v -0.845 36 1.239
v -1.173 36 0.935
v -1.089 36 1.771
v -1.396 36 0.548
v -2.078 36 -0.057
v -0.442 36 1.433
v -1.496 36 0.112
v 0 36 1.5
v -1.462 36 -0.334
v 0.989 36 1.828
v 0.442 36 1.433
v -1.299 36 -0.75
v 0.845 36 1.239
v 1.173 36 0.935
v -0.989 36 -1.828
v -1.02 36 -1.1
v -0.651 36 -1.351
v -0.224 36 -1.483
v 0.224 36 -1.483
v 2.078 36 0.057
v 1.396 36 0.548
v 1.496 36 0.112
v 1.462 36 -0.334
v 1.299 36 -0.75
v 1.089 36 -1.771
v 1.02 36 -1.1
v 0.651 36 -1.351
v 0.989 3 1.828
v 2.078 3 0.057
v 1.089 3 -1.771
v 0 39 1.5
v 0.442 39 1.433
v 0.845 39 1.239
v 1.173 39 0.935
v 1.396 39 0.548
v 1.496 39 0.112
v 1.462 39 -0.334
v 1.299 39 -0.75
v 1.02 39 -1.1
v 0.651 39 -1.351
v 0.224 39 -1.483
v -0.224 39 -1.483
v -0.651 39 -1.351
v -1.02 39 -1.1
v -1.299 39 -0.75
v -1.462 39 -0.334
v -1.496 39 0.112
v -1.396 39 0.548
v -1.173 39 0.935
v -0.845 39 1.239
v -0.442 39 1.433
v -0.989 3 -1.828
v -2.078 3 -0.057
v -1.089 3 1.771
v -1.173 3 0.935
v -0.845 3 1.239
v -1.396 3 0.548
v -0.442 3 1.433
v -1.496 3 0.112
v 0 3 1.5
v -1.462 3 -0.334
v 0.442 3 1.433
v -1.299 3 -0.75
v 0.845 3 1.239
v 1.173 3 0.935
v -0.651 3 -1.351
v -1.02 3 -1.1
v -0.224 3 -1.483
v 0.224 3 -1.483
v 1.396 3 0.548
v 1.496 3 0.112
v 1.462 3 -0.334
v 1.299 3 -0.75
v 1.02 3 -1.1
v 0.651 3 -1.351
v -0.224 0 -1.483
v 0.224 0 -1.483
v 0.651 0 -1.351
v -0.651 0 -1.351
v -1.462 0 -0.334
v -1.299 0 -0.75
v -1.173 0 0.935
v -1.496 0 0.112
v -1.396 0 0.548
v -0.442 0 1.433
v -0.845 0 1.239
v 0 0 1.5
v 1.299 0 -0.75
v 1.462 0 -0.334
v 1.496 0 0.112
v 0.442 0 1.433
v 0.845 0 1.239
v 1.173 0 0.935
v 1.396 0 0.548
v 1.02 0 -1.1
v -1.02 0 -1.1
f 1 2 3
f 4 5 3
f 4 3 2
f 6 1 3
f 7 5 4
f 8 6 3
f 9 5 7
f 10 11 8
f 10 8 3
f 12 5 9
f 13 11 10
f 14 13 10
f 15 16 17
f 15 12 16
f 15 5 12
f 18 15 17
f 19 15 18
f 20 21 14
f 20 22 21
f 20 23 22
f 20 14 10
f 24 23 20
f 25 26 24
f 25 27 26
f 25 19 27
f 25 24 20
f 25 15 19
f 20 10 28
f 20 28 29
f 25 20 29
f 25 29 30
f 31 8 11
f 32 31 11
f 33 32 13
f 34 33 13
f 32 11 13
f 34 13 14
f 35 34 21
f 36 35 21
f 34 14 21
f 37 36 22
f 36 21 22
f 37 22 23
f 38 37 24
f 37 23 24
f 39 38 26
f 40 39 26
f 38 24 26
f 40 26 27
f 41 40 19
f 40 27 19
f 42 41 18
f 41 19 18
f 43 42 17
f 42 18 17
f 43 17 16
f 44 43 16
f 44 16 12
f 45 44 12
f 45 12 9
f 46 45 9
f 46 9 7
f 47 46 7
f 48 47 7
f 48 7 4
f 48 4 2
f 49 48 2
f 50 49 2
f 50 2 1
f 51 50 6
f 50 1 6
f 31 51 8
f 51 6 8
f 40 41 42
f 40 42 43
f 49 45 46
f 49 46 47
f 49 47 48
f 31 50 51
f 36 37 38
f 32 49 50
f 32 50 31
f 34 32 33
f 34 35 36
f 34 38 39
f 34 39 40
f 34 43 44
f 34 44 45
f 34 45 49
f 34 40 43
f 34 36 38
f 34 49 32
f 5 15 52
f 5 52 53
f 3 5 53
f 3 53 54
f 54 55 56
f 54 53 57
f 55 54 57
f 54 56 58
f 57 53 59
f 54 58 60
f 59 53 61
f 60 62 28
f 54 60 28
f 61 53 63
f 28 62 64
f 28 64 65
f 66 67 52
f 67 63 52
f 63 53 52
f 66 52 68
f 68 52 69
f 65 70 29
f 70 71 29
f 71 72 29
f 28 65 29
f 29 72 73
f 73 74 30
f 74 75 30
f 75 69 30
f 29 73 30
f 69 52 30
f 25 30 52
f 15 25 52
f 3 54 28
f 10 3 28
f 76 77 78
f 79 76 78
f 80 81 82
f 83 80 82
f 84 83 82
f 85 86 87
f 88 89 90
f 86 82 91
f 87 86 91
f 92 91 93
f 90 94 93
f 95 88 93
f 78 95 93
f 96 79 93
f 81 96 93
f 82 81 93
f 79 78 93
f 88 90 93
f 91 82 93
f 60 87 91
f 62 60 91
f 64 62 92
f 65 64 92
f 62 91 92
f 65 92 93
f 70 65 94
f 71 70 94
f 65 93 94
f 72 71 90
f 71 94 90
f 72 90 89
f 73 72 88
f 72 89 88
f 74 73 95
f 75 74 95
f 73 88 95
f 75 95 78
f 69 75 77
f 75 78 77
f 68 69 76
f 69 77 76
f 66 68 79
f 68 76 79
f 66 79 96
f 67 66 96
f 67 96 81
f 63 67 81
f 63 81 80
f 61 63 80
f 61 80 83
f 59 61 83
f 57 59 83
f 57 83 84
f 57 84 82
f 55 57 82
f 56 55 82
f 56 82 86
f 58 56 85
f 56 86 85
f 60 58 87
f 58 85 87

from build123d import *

# Parameters (mm, degrees)
SKETCH1_R           = 1.5
BOSS_EXTRUDE1_DEPTH = 3
BOSS_EXTRUDE2_DEPTH = 33
SKETCH3_R           = 1.5
BOSS_EXTRUDE3_DEPTH = 3


with BuildPart() as part:
    # Sketch1 → Boss-Extrude1 (new body)
    with BuildSketch(Plane(origin=(0, 0, 0), x_dir=(1, 0, 0), z_dir=(0, 1, 0))):
        with Locations(Location((0, 0, 0), (0, 0, 270))):
            Circle(SKETCH1_R)
    extrude(amount=BOSS_EXTRUDE1_DEPTH)

    # Sketch2 → Boss-Extrude2 (add)
    with BuildSketch(Plane(origin=(0, 3, 0), x_dir=(1, 0, 0), z_dir=(0, 1, 0))):
        Polygon((-0.98915483, 1.827996915), (-2.077669182, 0.057365247), (-1.088514352, -1.770631668), (0.98915483, -1.827996915), (2.077669182, -0.057365247), (1.088514352, 1.770631668), align=None)
    extrude(amount=BOSS_EXTRUDE2_DEPTH)

    # Sketch3 → Boss-Extrude3 (add)
    with BuildSketch(Plane(origin=(0, 36, 0), x_dir=(1, 0, 0), z_dir=(0, 1, 0))):
        with Locations(Location((0, 0, 0), (0, 0, 270))):
            Circle(SKETCH3_R)
    extrude(amount=BOSS_EXTRUDE3_DEPTH)


solid = part.part
